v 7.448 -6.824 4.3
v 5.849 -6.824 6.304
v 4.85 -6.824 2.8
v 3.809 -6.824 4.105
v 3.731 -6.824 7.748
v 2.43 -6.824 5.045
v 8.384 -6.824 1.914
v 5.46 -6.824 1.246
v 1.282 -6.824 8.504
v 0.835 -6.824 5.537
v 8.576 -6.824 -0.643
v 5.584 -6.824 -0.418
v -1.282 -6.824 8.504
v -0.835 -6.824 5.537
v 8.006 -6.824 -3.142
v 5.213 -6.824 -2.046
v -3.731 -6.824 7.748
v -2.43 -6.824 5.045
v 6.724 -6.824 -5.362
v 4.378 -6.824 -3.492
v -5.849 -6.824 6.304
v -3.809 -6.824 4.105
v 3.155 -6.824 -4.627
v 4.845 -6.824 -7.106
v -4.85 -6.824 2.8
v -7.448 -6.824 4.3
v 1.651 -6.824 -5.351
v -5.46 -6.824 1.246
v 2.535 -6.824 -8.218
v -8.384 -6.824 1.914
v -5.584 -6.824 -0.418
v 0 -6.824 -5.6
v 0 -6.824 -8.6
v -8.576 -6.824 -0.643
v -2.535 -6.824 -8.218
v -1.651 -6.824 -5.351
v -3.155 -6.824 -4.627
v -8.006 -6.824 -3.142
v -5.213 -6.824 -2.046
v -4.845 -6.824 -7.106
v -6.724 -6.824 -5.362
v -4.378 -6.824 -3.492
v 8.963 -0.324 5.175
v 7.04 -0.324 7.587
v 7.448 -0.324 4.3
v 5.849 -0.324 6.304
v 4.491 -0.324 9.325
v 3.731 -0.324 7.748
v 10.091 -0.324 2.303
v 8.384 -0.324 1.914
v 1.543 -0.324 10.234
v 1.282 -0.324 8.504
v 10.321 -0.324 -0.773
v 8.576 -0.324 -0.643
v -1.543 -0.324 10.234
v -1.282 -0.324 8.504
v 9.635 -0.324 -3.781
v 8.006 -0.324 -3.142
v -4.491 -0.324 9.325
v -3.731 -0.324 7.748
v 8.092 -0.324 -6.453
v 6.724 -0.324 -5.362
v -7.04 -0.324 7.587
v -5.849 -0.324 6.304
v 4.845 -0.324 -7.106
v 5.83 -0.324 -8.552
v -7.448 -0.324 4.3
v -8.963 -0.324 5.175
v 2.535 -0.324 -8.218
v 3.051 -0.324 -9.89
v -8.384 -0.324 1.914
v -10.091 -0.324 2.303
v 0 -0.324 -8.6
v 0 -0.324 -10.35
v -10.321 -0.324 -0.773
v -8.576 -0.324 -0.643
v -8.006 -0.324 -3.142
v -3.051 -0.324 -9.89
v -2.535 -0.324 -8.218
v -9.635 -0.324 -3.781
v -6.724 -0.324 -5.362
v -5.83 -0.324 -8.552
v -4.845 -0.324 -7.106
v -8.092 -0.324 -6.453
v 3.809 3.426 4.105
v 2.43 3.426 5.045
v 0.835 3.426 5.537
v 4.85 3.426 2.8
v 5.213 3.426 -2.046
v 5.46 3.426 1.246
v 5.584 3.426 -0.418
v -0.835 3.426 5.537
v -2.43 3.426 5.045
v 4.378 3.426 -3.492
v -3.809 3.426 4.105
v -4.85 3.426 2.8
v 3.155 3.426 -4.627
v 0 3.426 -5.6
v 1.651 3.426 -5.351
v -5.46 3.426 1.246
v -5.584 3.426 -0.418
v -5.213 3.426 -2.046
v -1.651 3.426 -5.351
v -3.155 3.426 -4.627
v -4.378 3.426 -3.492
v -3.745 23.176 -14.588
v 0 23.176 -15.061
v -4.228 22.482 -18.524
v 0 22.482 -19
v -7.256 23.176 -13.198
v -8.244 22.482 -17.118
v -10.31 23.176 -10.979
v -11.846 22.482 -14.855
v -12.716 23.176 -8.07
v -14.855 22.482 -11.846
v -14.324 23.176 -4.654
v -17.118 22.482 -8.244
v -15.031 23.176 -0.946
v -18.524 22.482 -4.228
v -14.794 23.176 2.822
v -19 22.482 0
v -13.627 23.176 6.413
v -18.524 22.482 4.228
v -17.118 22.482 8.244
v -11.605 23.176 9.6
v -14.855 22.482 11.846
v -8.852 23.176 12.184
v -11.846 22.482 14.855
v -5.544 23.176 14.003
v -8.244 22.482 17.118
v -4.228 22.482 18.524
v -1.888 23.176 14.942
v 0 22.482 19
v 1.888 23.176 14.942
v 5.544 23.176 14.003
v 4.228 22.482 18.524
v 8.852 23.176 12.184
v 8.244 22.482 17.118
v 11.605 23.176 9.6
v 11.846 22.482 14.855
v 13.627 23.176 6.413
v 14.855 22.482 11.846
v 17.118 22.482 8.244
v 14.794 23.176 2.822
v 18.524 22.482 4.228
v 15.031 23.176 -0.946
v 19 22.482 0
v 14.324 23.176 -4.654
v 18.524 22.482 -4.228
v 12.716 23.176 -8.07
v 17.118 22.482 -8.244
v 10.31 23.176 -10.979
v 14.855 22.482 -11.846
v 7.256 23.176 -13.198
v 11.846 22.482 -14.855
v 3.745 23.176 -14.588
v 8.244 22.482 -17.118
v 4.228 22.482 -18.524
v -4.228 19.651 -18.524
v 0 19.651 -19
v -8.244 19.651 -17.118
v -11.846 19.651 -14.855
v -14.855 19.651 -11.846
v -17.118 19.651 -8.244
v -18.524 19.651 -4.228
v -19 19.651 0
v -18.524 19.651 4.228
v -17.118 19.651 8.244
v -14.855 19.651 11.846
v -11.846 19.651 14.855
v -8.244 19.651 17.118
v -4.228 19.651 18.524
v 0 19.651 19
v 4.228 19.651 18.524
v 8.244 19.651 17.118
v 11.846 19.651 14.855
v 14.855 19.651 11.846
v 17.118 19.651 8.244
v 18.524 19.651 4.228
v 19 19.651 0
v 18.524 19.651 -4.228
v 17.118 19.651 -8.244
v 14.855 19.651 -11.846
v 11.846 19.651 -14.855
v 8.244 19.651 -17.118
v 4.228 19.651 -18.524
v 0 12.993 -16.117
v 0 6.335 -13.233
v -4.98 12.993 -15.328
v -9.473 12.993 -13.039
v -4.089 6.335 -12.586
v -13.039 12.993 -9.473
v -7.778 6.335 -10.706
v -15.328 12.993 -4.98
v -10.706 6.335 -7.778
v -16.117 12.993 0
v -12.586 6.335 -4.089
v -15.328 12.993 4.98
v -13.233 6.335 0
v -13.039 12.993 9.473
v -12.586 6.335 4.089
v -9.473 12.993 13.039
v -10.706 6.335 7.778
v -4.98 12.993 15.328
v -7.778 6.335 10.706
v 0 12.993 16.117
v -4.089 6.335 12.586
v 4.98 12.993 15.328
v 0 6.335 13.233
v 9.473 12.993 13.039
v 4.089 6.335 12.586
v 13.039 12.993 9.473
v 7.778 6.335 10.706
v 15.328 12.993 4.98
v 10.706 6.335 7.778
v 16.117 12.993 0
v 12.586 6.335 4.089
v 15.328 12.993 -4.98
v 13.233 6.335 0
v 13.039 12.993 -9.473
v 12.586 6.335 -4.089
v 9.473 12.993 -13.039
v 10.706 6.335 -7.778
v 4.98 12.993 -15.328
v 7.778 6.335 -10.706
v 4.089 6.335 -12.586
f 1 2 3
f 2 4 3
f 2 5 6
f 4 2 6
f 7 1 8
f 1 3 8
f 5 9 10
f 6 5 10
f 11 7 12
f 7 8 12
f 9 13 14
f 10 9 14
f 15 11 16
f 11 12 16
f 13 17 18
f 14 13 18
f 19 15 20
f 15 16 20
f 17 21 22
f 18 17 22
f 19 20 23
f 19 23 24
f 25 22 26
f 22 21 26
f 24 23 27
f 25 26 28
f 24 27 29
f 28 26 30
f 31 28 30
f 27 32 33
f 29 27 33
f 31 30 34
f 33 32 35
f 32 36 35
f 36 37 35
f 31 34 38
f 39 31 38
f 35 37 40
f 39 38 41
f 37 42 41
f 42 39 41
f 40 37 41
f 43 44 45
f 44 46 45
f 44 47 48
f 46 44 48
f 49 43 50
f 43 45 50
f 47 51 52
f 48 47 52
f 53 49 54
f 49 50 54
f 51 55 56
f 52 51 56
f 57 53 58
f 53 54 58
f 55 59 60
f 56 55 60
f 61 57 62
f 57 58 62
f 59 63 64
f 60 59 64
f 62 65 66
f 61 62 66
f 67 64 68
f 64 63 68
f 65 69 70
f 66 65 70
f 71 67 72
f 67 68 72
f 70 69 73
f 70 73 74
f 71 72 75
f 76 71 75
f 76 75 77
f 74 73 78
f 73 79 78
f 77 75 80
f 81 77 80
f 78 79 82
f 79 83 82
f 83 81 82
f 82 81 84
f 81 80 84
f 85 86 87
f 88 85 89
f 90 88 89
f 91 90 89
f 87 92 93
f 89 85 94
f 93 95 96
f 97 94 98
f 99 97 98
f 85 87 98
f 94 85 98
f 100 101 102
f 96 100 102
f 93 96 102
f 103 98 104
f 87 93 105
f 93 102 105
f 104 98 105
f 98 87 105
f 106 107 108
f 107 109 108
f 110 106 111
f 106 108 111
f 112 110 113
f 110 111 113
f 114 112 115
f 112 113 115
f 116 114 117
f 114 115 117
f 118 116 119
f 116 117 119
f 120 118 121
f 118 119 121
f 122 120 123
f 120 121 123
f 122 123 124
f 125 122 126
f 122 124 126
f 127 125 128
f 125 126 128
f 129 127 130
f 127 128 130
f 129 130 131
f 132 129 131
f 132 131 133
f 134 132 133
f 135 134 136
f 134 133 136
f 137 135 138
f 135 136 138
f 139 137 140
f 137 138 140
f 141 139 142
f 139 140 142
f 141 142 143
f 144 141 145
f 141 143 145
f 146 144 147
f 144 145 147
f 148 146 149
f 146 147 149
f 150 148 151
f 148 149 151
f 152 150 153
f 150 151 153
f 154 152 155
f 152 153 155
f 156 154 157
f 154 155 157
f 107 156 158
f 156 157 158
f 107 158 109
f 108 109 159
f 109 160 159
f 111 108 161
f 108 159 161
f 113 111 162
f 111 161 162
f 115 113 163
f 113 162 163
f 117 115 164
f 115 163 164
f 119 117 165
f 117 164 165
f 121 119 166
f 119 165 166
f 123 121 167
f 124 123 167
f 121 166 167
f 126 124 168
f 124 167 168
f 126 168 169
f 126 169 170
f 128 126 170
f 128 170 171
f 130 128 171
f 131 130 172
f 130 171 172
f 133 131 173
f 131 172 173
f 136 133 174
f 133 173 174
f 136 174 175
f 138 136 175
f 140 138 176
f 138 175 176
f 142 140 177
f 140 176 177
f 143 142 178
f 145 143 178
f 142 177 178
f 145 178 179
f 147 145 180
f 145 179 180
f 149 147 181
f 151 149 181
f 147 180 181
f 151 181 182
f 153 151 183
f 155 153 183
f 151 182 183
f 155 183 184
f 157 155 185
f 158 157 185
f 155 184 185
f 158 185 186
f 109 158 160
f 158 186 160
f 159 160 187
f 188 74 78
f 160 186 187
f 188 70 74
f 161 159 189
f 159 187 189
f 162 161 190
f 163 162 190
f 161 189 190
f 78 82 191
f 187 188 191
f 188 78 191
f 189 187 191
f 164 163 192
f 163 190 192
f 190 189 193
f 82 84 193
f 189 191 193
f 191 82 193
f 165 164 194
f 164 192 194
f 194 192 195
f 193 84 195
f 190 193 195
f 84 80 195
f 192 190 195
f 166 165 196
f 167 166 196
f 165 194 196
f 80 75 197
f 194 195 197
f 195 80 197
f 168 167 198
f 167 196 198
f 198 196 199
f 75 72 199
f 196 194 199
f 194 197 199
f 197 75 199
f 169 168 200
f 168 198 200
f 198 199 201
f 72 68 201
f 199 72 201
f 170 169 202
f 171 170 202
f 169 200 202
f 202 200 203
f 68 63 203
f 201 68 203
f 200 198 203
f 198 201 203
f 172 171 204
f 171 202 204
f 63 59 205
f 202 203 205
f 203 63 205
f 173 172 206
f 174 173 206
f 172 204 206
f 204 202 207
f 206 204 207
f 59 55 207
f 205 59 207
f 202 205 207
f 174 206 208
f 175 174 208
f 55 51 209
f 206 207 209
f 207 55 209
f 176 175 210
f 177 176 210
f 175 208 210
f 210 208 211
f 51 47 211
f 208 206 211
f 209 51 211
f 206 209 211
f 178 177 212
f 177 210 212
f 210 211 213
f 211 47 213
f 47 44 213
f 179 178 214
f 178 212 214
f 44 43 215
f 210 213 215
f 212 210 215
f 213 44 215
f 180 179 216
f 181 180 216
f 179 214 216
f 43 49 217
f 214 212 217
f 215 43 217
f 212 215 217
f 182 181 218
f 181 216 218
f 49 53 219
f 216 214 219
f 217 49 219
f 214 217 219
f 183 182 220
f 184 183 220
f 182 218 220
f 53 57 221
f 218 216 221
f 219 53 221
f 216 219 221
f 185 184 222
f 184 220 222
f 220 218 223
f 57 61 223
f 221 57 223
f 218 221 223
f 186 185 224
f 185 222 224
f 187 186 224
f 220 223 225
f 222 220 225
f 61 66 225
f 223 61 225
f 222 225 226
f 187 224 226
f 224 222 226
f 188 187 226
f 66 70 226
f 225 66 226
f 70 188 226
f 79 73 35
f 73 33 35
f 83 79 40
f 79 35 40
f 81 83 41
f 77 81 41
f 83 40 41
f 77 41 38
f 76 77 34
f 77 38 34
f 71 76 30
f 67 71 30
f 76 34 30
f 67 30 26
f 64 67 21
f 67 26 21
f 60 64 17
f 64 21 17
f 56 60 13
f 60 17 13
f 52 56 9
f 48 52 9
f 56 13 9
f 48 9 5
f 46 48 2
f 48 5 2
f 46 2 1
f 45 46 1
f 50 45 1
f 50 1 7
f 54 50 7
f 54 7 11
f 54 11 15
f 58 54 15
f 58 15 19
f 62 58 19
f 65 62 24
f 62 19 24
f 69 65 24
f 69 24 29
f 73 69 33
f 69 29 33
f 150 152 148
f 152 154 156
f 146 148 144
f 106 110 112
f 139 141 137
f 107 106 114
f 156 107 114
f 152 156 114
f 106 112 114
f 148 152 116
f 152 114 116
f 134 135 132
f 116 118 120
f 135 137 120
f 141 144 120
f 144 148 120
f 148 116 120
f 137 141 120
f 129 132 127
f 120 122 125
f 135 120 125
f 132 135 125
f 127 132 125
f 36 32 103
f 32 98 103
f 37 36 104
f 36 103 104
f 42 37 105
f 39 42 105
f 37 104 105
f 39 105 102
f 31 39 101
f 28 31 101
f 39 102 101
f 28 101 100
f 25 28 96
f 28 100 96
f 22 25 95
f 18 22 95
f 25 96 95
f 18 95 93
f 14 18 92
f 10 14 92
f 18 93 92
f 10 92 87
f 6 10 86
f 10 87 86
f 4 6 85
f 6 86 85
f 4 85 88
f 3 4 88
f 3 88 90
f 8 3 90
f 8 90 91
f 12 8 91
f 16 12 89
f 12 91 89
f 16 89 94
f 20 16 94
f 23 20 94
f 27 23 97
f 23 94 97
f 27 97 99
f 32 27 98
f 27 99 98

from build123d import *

# Parameters (mm, degrees)
SKETCH3_R          = 3
CUT_EXTRUDE1_DEPTH = 5


with BuildPart() as part:
    # Sketch1 → Revolve1 (revolve)
    with BuildSketch(Plane.XY, mode=Mode.PRIVATE) as revolve1_sk:
        Polygon((-15.060768988, 23.176328976), (-19, 22.481736265), (-19, 19.651328976), (-10.35, -0.323671024), (-8.6, -0.323671024), (-8.6, -6.823671024), (-5.6, -6.823671024), (-5.6, 3.426328976), (-3, 3.426328976), (-3, -1.573671024), (0, -1.573671024), (0, 23.176328976), align=None)
    revolve(revolve1_sk.sketch.rotate(Axis((0, -1.573671024, 0), (0, 1, 0)), 270), axis=Axis((0, -1.573671024, 0), (0, 1, 0)))

    # Sketch3 → Cut-Extrude1 (cut)
    with BuildSketch(Plane.XZ.offset(1.573671024)):
        Circle(SKETCH3_R)
    extrude(amount=-CUT_EXTRUDE1_DEPTH, mode=Mode.SUBTRACT)


solid = part.part
